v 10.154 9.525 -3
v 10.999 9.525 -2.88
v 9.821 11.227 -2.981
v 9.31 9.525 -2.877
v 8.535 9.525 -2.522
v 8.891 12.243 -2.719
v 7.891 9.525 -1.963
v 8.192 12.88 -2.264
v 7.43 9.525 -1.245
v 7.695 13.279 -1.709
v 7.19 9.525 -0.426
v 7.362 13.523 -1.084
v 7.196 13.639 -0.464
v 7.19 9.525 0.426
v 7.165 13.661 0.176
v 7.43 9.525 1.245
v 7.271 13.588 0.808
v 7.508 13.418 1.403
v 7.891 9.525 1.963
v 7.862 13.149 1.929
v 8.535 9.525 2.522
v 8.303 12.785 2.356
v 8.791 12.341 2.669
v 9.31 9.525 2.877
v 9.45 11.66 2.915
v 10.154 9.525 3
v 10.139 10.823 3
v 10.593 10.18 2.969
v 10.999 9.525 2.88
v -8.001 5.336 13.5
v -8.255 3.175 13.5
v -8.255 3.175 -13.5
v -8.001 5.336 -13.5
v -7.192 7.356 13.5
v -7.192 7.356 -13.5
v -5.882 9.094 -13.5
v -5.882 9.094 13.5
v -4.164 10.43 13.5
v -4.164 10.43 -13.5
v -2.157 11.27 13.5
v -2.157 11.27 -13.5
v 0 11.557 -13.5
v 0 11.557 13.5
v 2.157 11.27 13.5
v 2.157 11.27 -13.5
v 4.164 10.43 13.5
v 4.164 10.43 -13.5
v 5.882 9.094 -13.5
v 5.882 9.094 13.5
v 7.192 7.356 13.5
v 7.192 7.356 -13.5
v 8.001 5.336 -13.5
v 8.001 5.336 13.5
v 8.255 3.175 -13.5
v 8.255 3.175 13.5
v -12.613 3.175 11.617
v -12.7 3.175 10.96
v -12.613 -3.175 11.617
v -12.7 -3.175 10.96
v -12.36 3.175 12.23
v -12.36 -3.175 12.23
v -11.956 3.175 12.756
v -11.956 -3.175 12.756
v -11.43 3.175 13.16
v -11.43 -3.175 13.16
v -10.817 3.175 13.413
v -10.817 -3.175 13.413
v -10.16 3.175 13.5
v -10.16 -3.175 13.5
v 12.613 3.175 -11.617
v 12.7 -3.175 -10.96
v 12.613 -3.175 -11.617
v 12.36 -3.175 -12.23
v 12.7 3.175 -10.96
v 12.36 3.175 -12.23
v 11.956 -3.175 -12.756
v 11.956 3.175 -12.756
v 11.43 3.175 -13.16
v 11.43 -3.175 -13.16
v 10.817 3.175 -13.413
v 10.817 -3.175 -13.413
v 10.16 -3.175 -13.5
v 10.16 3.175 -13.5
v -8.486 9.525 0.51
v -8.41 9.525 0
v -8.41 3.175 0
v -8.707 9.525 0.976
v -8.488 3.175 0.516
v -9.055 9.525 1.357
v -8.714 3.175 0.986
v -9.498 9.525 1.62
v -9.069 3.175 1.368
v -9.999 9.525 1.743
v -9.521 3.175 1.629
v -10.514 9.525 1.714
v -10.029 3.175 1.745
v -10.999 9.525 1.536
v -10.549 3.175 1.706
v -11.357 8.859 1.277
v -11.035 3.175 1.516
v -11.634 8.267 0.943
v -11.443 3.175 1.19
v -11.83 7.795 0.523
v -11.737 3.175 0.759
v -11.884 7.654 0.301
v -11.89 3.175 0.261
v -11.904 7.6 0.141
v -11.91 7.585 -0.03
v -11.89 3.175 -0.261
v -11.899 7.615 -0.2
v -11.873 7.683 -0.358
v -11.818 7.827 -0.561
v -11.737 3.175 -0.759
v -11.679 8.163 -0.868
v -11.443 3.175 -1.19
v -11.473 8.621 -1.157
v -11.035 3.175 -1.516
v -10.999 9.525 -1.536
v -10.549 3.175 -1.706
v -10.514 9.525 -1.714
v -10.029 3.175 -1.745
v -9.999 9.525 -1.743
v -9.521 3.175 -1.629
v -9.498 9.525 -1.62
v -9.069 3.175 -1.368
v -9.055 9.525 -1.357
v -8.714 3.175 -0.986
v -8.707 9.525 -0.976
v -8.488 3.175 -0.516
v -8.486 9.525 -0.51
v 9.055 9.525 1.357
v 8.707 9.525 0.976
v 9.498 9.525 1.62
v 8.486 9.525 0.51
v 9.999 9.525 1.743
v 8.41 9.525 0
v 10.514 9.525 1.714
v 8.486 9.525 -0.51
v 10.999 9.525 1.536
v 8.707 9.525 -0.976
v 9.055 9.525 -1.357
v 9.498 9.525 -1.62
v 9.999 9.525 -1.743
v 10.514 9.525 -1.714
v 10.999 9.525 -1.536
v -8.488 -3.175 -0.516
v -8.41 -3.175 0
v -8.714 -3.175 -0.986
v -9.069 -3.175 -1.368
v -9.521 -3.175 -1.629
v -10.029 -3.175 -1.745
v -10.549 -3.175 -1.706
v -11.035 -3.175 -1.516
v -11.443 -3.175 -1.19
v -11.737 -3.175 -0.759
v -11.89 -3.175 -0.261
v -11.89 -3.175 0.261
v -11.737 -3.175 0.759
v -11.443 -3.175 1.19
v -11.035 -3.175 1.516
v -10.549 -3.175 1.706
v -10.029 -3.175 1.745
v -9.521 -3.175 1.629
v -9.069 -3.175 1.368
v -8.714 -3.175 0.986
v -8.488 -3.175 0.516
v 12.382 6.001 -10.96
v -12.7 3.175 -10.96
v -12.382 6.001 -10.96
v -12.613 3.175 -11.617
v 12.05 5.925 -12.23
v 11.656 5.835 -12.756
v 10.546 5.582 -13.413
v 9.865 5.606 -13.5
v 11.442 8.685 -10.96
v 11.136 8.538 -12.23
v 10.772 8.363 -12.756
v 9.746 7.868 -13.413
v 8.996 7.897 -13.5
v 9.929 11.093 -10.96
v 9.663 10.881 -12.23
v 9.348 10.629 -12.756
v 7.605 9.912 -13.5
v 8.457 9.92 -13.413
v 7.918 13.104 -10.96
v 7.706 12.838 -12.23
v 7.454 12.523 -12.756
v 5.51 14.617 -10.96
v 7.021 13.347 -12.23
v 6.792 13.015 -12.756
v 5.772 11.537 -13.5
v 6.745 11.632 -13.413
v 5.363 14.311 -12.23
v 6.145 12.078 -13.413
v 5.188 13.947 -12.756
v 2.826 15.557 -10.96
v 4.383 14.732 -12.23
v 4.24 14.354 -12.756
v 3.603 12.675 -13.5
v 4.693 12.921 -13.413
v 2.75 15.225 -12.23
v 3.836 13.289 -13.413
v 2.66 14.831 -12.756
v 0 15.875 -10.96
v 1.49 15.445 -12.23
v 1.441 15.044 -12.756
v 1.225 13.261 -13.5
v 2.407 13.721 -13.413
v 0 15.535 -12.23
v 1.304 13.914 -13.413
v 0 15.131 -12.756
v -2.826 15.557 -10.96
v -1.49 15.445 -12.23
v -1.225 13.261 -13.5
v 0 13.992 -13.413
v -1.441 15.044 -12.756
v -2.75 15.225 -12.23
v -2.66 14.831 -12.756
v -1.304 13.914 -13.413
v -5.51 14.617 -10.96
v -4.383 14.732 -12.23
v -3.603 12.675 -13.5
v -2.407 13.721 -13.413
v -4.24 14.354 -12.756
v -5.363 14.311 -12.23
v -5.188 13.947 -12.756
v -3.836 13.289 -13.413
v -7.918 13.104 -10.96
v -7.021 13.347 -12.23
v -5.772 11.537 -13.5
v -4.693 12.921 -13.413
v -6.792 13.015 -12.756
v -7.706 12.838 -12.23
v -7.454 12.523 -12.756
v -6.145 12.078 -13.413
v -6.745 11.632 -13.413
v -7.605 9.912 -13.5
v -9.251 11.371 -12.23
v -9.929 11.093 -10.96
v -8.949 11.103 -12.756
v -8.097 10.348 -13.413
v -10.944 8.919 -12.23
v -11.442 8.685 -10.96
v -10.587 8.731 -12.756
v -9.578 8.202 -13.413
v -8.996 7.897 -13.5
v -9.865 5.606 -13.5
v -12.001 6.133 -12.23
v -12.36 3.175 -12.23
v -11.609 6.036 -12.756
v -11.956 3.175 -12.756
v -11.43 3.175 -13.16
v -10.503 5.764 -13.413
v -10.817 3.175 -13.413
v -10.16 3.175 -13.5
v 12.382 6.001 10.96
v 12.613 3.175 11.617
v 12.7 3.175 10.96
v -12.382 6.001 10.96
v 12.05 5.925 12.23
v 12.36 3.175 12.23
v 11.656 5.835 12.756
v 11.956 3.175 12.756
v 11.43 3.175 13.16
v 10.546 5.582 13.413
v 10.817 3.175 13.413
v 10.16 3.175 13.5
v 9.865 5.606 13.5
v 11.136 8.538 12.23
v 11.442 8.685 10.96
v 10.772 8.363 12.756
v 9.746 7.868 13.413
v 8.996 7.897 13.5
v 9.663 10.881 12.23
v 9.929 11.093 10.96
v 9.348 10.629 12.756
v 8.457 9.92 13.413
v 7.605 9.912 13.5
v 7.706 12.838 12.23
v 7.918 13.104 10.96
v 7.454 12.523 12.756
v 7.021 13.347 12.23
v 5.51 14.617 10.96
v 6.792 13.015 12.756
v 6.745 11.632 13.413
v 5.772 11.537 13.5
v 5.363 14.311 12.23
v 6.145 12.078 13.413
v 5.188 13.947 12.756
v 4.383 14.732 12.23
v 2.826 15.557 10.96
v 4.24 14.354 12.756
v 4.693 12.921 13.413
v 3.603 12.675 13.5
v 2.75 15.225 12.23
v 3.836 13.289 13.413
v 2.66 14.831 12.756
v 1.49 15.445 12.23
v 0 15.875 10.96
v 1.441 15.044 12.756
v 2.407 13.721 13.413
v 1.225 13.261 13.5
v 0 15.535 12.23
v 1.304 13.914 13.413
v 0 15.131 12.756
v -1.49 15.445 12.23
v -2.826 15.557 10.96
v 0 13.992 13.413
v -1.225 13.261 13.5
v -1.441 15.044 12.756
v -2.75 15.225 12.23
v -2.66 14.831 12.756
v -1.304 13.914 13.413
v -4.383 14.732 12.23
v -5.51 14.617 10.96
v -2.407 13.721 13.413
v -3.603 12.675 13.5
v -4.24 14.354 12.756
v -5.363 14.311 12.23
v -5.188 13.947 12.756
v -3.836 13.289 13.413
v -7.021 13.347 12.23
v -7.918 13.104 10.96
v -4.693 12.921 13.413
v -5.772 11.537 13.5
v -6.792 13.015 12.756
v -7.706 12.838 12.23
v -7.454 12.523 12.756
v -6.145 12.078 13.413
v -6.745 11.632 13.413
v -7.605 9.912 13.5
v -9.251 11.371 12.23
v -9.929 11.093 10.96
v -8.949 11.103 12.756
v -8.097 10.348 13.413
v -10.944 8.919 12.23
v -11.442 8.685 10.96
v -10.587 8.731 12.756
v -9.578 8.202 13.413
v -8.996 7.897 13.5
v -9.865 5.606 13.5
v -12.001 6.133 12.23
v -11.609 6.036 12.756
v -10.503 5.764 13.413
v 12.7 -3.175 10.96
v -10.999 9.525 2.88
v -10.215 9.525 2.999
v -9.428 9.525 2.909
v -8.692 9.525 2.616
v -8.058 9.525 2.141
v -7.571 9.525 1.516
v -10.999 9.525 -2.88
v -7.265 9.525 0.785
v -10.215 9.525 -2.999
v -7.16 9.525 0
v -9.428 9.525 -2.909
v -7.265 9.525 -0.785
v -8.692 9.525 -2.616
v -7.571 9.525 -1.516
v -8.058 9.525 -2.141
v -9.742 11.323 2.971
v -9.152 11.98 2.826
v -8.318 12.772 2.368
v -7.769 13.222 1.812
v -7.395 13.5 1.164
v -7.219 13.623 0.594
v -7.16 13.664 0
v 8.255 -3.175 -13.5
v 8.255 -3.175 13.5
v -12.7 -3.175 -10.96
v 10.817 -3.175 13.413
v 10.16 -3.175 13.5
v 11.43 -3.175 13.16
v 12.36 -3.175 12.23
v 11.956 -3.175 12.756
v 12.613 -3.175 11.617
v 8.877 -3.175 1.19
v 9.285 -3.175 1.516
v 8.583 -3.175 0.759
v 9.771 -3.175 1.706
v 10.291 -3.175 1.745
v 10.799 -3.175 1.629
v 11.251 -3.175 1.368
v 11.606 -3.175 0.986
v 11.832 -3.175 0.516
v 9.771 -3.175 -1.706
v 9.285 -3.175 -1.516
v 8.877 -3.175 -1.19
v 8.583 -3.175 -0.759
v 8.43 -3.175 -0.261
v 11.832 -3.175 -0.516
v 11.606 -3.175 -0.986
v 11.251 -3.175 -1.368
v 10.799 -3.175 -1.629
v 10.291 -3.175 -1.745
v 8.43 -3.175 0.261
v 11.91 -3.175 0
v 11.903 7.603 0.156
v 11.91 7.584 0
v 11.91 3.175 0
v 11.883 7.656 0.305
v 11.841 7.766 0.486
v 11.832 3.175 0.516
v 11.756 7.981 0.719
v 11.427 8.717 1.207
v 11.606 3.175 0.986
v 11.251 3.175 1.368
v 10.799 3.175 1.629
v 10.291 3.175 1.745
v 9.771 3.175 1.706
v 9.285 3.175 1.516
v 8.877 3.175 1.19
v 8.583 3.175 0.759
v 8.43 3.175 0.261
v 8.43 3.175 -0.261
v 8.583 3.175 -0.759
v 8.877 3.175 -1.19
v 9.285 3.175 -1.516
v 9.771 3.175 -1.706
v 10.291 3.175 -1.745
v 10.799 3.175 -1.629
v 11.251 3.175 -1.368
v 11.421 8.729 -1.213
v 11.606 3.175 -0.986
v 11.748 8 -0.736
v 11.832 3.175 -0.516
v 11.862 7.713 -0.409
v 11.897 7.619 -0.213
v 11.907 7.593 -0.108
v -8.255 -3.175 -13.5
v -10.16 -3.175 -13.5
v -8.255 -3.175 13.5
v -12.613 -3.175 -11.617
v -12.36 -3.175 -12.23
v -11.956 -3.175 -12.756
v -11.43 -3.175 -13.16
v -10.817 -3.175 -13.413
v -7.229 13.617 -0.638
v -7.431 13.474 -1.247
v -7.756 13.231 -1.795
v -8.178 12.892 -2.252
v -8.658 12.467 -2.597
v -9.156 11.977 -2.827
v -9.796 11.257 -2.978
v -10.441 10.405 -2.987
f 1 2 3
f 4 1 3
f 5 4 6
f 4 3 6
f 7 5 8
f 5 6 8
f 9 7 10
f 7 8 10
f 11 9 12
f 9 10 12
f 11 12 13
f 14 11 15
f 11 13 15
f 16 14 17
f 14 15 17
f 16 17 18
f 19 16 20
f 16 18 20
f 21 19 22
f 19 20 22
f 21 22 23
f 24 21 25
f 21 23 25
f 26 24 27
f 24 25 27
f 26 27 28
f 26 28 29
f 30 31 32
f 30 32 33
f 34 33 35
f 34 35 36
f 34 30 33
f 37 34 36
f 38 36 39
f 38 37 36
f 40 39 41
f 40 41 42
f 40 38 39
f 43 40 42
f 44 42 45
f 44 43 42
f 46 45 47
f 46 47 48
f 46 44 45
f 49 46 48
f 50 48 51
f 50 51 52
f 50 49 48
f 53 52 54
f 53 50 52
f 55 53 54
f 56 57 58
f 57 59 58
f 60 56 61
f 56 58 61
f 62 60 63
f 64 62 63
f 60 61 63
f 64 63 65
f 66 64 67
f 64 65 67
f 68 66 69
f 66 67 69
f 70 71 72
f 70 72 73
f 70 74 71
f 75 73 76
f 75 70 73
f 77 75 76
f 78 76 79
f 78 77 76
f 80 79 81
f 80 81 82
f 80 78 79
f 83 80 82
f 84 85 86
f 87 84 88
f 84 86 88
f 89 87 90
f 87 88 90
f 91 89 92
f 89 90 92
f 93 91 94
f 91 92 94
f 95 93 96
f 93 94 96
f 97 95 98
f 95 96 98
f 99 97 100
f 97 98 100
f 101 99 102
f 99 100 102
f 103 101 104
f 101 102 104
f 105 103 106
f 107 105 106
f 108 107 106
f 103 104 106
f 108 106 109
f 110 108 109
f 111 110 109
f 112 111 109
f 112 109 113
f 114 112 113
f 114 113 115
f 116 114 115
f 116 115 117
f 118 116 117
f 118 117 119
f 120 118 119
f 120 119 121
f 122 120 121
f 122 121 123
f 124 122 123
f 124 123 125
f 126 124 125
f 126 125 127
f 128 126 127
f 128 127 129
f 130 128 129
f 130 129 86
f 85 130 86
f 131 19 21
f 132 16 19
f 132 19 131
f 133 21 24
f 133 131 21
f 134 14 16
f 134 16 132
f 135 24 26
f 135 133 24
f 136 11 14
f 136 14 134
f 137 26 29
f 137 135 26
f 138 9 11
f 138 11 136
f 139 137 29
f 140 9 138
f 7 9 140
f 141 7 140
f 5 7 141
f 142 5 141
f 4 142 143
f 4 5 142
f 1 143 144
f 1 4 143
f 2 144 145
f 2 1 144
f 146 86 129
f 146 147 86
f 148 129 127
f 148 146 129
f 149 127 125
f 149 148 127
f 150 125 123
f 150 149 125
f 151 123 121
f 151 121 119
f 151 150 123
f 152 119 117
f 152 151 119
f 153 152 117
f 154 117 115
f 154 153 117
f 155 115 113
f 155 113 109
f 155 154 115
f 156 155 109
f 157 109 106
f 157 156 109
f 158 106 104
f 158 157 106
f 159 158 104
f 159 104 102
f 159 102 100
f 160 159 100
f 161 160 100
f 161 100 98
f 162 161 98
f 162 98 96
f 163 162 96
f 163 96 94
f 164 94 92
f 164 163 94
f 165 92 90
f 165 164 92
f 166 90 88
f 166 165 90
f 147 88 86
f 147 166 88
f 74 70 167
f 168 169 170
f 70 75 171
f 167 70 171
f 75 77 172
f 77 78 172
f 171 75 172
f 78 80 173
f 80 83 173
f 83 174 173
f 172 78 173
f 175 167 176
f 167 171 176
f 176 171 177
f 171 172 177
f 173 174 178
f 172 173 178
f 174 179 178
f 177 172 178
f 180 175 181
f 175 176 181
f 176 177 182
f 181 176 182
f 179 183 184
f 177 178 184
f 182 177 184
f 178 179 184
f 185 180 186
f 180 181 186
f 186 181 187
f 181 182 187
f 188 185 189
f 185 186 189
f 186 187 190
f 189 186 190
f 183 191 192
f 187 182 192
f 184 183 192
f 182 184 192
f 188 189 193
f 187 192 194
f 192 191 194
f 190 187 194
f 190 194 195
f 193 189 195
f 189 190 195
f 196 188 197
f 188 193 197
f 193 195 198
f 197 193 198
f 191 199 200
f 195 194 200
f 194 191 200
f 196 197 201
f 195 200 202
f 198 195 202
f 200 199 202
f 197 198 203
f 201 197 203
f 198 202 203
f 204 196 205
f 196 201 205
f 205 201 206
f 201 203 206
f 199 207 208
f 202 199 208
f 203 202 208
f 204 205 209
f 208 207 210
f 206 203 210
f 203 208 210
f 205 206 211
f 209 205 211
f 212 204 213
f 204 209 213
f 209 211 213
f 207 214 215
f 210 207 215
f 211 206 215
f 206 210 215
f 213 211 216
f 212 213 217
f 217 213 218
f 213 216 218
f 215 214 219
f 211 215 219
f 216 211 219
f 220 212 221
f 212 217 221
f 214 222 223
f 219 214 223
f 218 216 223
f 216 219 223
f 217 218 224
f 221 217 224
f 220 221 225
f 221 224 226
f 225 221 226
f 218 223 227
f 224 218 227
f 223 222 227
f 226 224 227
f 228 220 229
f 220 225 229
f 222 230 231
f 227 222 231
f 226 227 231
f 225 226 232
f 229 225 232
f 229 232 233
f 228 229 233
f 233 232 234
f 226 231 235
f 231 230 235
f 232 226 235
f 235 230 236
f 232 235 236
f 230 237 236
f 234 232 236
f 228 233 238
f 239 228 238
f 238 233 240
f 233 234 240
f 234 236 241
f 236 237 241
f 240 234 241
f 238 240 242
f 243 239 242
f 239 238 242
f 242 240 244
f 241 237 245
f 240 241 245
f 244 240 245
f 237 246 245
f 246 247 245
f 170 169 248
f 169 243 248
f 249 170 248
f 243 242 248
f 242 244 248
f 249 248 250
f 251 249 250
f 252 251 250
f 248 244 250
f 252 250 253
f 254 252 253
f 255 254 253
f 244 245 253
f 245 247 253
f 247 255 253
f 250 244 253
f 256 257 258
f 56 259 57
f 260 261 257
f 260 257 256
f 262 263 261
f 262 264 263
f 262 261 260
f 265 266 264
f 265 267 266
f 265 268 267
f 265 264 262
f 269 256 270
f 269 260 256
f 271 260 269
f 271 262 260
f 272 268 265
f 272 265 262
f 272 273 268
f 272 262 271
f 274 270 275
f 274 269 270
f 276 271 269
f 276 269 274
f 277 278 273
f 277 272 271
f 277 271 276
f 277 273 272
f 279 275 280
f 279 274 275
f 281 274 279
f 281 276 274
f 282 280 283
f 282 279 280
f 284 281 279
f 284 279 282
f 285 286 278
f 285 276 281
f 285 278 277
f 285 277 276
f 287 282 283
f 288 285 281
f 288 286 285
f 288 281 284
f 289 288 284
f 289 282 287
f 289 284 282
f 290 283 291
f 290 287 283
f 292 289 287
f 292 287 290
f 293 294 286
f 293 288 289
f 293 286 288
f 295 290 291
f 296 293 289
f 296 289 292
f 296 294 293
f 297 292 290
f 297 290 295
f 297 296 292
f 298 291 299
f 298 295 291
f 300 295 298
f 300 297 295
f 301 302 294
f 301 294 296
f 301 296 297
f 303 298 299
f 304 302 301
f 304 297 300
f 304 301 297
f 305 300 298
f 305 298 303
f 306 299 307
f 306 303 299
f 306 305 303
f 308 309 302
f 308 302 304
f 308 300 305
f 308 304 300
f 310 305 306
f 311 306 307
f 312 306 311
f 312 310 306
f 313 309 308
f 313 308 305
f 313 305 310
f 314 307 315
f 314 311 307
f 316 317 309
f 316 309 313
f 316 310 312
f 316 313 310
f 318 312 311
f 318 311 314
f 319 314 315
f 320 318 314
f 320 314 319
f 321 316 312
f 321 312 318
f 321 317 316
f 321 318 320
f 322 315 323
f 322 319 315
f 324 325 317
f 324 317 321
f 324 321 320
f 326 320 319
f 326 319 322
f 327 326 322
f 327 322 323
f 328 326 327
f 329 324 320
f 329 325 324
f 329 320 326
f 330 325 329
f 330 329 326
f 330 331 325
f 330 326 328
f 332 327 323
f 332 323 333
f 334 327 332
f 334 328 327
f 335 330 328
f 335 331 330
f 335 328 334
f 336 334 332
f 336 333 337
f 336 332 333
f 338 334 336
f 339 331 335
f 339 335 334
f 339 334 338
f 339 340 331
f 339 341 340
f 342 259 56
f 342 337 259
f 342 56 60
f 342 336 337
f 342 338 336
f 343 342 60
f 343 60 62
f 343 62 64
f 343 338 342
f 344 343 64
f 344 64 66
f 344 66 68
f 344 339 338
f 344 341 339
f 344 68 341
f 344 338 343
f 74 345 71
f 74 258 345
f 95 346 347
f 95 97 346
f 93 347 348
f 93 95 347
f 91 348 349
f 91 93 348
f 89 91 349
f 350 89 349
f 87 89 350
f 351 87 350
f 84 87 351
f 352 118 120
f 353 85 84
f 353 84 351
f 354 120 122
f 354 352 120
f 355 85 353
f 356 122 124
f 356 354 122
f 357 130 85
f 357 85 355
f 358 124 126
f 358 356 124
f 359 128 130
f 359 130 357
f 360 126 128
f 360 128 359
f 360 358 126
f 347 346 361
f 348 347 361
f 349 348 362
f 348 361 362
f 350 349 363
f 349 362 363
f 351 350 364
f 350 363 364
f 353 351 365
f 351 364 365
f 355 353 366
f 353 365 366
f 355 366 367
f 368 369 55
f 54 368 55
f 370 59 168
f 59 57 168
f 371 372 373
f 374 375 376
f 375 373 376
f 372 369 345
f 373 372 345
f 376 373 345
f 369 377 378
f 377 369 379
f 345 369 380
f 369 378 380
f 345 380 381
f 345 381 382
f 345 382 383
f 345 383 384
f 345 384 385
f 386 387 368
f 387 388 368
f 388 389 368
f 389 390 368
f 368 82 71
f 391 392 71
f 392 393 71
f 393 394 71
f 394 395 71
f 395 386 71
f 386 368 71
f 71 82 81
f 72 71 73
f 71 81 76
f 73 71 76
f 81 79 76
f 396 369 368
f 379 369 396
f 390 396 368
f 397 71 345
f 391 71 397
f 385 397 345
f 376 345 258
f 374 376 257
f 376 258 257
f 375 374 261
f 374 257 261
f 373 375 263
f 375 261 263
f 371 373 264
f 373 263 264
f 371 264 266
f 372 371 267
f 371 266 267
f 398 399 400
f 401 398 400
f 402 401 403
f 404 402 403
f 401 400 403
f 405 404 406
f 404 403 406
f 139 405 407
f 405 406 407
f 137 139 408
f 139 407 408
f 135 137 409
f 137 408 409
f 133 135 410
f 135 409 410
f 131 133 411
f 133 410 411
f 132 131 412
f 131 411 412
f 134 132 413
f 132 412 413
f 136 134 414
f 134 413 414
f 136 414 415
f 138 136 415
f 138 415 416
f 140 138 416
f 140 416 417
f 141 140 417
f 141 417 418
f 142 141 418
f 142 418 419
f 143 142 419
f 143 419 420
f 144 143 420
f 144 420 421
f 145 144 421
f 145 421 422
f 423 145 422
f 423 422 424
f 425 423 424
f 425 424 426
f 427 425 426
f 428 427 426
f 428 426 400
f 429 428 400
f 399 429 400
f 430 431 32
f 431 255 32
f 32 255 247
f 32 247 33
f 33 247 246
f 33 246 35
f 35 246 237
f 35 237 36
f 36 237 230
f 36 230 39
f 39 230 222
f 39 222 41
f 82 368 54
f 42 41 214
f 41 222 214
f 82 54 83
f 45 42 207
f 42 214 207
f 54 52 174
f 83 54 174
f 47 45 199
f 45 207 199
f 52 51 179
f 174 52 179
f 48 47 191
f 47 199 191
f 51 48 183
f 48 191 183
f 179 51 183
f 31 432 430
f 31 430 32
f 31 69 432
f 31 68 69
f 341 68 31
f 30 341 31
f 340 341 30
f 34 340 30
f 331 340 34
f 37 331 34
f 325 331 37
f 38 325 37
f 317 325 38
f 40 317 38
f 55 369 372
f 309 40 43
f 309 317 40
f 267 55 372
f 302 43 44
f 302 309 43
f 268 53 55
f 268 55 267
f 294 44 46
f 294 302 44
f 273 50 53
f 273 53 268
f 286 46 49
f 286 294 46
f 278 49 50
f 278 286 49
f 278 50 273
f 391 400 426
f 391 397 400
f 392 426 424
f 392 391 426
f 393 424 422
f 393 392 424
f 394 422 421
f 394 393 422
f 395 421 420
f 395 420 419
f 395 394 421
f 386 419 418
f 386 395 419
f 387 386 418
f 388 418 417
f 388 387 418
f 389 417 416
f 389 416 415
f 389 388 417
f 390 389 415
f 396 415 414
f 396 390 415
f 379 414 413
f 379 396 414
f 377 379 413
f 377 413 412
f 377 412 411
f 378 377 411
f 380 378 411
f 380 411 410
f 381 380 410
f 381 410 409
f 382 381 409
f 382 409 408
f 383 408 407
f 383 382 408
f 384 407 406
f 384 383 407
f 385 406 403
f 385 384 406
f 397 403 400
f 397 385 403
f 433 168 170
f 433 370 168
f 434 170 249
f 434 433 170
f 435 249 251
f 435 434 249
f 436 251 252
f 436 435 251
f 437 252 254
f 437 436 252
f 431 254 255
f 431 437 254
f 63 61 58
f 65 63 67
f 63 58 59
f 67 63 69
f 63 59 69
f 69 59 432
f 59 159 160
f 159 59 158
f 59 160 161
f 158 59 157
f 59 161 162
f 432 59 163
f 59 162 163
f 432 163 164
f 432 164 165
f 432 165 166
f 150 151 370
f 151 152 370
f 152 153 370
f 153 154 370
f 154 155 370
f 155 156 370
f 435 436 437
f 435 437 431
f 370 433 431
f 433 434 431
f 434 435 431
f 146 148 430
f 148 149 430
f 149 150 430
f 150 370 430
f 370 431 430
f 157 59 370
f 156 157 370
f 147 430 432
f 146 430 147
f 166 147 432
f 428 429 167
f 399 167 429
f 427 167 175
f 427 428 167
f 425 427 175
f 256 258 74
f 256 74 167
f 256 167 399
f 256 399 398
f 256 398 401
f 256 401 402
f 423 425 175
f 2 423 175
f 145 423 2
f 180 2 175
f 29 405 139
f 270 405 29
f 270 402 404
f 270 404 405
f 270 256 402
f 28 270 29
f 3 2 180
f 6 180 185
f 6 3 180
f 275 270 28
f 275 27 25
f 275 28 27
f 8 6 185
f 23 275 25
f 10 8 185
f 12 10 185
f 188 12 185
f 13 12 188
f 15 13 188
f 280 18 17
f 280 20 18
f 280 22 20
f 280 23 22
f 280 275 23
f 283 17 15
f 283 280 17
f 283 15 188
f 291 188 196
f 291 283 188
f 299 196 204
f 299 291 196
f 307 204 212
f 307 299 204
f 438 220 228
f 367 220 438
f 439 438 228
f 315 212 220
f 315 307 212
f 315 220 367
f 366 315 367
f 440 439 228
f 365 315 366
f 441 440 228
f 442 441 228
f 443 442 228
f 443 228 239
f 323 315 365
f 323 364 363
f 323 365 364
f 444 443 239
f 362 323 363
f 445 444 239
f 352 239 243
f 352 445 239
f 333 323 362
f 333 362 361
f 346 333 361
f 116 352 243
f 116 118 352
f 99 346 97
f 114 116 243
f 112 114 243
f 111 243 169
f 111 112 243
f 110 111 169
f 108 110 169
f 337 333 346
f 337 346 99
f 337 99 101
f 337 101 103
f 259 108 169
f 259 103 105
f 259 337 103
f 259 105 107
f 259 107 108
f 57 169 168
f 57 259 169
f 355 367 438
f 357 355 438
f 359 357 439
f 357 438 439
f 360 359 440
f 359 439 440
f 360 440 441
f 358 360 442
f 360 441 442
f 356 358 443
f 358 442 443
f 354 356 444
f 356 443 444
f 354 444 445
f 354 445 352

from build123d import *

# Parameters (mm, degrees)
SKETCH1_W           = 25.4
SKETCH1_H           = 27
SKETCH1_R           = 1.75
BOSS_EXTRUDE1_DEPTH = 3.175
SKETCH2_W           = 16.51
SKETCH2_H           = 6.35
CUT_EXTRUDE1_DEPTH  = 28
BOSS_EXTRUDE2_DEPTH = 27
SKETCH4_R           = 1.75
CUT_EXTRUDE2_DEPTH  = 13.7
SKETCH5_R           = 3
CUT_EXTRUDE3_DEPTH  = 6.35
FILLET1_R           = 2.54


with BuildPart() as part:
    # Sketch1 → Boss-Extrude1 (new body, symmetric)
    with BuildSketch(Plane(origin=(0, 0, 0), x_dir=(1, 0, 0), z_dir=(0, 1, 0))):
        Rectangle(SKETCH1_W, SKETCH1_H)
        with Locations((-10.16, 0)):
            Circle(SKETCH1_R, mode=Mode.SUBTRACT)
        with Locations((10.16, 0)):
            Circle(SKETCH1_R, mode=Mode.SUBTRACT)
    extrude(amount=BOSS_EXTRUDE1_DEPTH, both=True)

    # Sketch2 → Cut-Extrude1 (cut, through all)
    with BuildSketch(Plane.XY.offset(13.5)):
        Rectangle(SKETCH2_W, SKETCH2_H)
    extrude(amount=-CUT_EXTRUDE1_DEPTH, mode=Mode.SUBTRACT)

    # Sketch3 → Boss-Extrude2 (add, through all)
    with BuildSketch(Plane.XY.offset(13.5)):
        with BuildLine():
            Line((-12.7, 3.175), (-8.255, 3.175))
            ThreePointArc((-8.255, 3.175), (0, 11.557), (8.255, 3.175))
            Line((8.255, 3.175), (12.7, 3.175))
            ThreePointArc((12.7, 3.175), (0, 15.875), (-12.7, 3.175))
        make_face()
    extrude(amount=-BOSS_EXTRUDE2_DEPTH)

    # Sketch4 → Cut-Extrude2 (cut, through all)
    with BuildSketch(Plane.XZ.offset(-3.175)):
        with Locations((-10.16, 0)):
            Circle(SKETCH4_R)
        with Locations((10.16, 0)):
            Circle(SKETCH4_R)
    extrude(amount=-CUT_EXTRUDE2_DEPTH, mode=Mode.SUBTRACT)

    # Sketch5 → Cut-Extrude3 (cut)
    with BuildSketch(Plane(origin=(0, 15.875, 0), x_dir=(1, 0, 0), z_dir=(0, 1, 0))):
        with Locations((-10.16, 0)):
            Circle(SKETCH5_R)
        with Locations((10.16, 0)):
            Circle(SKETCH5_R)
    extrude(amount=-CUT_EXTRUDE3_DEPTH, mode=Mode.SUBTRACT)

    # Fillet1
    fillet1_edges = [part.edges().sort_by_distance(p)[0] for p in [
        (0, 15.875, -13.5),
        (0, 15.875, 13.5),
        (12.7, 0, -13.5),
        (12.7, 0, 13.5),
        (-12.7, 0, -13.5),
        (-12.7, 0, 13.5),
    ]]
    fillet(fillet1_edges, radius=FILLET1_R)


solid = part.part
